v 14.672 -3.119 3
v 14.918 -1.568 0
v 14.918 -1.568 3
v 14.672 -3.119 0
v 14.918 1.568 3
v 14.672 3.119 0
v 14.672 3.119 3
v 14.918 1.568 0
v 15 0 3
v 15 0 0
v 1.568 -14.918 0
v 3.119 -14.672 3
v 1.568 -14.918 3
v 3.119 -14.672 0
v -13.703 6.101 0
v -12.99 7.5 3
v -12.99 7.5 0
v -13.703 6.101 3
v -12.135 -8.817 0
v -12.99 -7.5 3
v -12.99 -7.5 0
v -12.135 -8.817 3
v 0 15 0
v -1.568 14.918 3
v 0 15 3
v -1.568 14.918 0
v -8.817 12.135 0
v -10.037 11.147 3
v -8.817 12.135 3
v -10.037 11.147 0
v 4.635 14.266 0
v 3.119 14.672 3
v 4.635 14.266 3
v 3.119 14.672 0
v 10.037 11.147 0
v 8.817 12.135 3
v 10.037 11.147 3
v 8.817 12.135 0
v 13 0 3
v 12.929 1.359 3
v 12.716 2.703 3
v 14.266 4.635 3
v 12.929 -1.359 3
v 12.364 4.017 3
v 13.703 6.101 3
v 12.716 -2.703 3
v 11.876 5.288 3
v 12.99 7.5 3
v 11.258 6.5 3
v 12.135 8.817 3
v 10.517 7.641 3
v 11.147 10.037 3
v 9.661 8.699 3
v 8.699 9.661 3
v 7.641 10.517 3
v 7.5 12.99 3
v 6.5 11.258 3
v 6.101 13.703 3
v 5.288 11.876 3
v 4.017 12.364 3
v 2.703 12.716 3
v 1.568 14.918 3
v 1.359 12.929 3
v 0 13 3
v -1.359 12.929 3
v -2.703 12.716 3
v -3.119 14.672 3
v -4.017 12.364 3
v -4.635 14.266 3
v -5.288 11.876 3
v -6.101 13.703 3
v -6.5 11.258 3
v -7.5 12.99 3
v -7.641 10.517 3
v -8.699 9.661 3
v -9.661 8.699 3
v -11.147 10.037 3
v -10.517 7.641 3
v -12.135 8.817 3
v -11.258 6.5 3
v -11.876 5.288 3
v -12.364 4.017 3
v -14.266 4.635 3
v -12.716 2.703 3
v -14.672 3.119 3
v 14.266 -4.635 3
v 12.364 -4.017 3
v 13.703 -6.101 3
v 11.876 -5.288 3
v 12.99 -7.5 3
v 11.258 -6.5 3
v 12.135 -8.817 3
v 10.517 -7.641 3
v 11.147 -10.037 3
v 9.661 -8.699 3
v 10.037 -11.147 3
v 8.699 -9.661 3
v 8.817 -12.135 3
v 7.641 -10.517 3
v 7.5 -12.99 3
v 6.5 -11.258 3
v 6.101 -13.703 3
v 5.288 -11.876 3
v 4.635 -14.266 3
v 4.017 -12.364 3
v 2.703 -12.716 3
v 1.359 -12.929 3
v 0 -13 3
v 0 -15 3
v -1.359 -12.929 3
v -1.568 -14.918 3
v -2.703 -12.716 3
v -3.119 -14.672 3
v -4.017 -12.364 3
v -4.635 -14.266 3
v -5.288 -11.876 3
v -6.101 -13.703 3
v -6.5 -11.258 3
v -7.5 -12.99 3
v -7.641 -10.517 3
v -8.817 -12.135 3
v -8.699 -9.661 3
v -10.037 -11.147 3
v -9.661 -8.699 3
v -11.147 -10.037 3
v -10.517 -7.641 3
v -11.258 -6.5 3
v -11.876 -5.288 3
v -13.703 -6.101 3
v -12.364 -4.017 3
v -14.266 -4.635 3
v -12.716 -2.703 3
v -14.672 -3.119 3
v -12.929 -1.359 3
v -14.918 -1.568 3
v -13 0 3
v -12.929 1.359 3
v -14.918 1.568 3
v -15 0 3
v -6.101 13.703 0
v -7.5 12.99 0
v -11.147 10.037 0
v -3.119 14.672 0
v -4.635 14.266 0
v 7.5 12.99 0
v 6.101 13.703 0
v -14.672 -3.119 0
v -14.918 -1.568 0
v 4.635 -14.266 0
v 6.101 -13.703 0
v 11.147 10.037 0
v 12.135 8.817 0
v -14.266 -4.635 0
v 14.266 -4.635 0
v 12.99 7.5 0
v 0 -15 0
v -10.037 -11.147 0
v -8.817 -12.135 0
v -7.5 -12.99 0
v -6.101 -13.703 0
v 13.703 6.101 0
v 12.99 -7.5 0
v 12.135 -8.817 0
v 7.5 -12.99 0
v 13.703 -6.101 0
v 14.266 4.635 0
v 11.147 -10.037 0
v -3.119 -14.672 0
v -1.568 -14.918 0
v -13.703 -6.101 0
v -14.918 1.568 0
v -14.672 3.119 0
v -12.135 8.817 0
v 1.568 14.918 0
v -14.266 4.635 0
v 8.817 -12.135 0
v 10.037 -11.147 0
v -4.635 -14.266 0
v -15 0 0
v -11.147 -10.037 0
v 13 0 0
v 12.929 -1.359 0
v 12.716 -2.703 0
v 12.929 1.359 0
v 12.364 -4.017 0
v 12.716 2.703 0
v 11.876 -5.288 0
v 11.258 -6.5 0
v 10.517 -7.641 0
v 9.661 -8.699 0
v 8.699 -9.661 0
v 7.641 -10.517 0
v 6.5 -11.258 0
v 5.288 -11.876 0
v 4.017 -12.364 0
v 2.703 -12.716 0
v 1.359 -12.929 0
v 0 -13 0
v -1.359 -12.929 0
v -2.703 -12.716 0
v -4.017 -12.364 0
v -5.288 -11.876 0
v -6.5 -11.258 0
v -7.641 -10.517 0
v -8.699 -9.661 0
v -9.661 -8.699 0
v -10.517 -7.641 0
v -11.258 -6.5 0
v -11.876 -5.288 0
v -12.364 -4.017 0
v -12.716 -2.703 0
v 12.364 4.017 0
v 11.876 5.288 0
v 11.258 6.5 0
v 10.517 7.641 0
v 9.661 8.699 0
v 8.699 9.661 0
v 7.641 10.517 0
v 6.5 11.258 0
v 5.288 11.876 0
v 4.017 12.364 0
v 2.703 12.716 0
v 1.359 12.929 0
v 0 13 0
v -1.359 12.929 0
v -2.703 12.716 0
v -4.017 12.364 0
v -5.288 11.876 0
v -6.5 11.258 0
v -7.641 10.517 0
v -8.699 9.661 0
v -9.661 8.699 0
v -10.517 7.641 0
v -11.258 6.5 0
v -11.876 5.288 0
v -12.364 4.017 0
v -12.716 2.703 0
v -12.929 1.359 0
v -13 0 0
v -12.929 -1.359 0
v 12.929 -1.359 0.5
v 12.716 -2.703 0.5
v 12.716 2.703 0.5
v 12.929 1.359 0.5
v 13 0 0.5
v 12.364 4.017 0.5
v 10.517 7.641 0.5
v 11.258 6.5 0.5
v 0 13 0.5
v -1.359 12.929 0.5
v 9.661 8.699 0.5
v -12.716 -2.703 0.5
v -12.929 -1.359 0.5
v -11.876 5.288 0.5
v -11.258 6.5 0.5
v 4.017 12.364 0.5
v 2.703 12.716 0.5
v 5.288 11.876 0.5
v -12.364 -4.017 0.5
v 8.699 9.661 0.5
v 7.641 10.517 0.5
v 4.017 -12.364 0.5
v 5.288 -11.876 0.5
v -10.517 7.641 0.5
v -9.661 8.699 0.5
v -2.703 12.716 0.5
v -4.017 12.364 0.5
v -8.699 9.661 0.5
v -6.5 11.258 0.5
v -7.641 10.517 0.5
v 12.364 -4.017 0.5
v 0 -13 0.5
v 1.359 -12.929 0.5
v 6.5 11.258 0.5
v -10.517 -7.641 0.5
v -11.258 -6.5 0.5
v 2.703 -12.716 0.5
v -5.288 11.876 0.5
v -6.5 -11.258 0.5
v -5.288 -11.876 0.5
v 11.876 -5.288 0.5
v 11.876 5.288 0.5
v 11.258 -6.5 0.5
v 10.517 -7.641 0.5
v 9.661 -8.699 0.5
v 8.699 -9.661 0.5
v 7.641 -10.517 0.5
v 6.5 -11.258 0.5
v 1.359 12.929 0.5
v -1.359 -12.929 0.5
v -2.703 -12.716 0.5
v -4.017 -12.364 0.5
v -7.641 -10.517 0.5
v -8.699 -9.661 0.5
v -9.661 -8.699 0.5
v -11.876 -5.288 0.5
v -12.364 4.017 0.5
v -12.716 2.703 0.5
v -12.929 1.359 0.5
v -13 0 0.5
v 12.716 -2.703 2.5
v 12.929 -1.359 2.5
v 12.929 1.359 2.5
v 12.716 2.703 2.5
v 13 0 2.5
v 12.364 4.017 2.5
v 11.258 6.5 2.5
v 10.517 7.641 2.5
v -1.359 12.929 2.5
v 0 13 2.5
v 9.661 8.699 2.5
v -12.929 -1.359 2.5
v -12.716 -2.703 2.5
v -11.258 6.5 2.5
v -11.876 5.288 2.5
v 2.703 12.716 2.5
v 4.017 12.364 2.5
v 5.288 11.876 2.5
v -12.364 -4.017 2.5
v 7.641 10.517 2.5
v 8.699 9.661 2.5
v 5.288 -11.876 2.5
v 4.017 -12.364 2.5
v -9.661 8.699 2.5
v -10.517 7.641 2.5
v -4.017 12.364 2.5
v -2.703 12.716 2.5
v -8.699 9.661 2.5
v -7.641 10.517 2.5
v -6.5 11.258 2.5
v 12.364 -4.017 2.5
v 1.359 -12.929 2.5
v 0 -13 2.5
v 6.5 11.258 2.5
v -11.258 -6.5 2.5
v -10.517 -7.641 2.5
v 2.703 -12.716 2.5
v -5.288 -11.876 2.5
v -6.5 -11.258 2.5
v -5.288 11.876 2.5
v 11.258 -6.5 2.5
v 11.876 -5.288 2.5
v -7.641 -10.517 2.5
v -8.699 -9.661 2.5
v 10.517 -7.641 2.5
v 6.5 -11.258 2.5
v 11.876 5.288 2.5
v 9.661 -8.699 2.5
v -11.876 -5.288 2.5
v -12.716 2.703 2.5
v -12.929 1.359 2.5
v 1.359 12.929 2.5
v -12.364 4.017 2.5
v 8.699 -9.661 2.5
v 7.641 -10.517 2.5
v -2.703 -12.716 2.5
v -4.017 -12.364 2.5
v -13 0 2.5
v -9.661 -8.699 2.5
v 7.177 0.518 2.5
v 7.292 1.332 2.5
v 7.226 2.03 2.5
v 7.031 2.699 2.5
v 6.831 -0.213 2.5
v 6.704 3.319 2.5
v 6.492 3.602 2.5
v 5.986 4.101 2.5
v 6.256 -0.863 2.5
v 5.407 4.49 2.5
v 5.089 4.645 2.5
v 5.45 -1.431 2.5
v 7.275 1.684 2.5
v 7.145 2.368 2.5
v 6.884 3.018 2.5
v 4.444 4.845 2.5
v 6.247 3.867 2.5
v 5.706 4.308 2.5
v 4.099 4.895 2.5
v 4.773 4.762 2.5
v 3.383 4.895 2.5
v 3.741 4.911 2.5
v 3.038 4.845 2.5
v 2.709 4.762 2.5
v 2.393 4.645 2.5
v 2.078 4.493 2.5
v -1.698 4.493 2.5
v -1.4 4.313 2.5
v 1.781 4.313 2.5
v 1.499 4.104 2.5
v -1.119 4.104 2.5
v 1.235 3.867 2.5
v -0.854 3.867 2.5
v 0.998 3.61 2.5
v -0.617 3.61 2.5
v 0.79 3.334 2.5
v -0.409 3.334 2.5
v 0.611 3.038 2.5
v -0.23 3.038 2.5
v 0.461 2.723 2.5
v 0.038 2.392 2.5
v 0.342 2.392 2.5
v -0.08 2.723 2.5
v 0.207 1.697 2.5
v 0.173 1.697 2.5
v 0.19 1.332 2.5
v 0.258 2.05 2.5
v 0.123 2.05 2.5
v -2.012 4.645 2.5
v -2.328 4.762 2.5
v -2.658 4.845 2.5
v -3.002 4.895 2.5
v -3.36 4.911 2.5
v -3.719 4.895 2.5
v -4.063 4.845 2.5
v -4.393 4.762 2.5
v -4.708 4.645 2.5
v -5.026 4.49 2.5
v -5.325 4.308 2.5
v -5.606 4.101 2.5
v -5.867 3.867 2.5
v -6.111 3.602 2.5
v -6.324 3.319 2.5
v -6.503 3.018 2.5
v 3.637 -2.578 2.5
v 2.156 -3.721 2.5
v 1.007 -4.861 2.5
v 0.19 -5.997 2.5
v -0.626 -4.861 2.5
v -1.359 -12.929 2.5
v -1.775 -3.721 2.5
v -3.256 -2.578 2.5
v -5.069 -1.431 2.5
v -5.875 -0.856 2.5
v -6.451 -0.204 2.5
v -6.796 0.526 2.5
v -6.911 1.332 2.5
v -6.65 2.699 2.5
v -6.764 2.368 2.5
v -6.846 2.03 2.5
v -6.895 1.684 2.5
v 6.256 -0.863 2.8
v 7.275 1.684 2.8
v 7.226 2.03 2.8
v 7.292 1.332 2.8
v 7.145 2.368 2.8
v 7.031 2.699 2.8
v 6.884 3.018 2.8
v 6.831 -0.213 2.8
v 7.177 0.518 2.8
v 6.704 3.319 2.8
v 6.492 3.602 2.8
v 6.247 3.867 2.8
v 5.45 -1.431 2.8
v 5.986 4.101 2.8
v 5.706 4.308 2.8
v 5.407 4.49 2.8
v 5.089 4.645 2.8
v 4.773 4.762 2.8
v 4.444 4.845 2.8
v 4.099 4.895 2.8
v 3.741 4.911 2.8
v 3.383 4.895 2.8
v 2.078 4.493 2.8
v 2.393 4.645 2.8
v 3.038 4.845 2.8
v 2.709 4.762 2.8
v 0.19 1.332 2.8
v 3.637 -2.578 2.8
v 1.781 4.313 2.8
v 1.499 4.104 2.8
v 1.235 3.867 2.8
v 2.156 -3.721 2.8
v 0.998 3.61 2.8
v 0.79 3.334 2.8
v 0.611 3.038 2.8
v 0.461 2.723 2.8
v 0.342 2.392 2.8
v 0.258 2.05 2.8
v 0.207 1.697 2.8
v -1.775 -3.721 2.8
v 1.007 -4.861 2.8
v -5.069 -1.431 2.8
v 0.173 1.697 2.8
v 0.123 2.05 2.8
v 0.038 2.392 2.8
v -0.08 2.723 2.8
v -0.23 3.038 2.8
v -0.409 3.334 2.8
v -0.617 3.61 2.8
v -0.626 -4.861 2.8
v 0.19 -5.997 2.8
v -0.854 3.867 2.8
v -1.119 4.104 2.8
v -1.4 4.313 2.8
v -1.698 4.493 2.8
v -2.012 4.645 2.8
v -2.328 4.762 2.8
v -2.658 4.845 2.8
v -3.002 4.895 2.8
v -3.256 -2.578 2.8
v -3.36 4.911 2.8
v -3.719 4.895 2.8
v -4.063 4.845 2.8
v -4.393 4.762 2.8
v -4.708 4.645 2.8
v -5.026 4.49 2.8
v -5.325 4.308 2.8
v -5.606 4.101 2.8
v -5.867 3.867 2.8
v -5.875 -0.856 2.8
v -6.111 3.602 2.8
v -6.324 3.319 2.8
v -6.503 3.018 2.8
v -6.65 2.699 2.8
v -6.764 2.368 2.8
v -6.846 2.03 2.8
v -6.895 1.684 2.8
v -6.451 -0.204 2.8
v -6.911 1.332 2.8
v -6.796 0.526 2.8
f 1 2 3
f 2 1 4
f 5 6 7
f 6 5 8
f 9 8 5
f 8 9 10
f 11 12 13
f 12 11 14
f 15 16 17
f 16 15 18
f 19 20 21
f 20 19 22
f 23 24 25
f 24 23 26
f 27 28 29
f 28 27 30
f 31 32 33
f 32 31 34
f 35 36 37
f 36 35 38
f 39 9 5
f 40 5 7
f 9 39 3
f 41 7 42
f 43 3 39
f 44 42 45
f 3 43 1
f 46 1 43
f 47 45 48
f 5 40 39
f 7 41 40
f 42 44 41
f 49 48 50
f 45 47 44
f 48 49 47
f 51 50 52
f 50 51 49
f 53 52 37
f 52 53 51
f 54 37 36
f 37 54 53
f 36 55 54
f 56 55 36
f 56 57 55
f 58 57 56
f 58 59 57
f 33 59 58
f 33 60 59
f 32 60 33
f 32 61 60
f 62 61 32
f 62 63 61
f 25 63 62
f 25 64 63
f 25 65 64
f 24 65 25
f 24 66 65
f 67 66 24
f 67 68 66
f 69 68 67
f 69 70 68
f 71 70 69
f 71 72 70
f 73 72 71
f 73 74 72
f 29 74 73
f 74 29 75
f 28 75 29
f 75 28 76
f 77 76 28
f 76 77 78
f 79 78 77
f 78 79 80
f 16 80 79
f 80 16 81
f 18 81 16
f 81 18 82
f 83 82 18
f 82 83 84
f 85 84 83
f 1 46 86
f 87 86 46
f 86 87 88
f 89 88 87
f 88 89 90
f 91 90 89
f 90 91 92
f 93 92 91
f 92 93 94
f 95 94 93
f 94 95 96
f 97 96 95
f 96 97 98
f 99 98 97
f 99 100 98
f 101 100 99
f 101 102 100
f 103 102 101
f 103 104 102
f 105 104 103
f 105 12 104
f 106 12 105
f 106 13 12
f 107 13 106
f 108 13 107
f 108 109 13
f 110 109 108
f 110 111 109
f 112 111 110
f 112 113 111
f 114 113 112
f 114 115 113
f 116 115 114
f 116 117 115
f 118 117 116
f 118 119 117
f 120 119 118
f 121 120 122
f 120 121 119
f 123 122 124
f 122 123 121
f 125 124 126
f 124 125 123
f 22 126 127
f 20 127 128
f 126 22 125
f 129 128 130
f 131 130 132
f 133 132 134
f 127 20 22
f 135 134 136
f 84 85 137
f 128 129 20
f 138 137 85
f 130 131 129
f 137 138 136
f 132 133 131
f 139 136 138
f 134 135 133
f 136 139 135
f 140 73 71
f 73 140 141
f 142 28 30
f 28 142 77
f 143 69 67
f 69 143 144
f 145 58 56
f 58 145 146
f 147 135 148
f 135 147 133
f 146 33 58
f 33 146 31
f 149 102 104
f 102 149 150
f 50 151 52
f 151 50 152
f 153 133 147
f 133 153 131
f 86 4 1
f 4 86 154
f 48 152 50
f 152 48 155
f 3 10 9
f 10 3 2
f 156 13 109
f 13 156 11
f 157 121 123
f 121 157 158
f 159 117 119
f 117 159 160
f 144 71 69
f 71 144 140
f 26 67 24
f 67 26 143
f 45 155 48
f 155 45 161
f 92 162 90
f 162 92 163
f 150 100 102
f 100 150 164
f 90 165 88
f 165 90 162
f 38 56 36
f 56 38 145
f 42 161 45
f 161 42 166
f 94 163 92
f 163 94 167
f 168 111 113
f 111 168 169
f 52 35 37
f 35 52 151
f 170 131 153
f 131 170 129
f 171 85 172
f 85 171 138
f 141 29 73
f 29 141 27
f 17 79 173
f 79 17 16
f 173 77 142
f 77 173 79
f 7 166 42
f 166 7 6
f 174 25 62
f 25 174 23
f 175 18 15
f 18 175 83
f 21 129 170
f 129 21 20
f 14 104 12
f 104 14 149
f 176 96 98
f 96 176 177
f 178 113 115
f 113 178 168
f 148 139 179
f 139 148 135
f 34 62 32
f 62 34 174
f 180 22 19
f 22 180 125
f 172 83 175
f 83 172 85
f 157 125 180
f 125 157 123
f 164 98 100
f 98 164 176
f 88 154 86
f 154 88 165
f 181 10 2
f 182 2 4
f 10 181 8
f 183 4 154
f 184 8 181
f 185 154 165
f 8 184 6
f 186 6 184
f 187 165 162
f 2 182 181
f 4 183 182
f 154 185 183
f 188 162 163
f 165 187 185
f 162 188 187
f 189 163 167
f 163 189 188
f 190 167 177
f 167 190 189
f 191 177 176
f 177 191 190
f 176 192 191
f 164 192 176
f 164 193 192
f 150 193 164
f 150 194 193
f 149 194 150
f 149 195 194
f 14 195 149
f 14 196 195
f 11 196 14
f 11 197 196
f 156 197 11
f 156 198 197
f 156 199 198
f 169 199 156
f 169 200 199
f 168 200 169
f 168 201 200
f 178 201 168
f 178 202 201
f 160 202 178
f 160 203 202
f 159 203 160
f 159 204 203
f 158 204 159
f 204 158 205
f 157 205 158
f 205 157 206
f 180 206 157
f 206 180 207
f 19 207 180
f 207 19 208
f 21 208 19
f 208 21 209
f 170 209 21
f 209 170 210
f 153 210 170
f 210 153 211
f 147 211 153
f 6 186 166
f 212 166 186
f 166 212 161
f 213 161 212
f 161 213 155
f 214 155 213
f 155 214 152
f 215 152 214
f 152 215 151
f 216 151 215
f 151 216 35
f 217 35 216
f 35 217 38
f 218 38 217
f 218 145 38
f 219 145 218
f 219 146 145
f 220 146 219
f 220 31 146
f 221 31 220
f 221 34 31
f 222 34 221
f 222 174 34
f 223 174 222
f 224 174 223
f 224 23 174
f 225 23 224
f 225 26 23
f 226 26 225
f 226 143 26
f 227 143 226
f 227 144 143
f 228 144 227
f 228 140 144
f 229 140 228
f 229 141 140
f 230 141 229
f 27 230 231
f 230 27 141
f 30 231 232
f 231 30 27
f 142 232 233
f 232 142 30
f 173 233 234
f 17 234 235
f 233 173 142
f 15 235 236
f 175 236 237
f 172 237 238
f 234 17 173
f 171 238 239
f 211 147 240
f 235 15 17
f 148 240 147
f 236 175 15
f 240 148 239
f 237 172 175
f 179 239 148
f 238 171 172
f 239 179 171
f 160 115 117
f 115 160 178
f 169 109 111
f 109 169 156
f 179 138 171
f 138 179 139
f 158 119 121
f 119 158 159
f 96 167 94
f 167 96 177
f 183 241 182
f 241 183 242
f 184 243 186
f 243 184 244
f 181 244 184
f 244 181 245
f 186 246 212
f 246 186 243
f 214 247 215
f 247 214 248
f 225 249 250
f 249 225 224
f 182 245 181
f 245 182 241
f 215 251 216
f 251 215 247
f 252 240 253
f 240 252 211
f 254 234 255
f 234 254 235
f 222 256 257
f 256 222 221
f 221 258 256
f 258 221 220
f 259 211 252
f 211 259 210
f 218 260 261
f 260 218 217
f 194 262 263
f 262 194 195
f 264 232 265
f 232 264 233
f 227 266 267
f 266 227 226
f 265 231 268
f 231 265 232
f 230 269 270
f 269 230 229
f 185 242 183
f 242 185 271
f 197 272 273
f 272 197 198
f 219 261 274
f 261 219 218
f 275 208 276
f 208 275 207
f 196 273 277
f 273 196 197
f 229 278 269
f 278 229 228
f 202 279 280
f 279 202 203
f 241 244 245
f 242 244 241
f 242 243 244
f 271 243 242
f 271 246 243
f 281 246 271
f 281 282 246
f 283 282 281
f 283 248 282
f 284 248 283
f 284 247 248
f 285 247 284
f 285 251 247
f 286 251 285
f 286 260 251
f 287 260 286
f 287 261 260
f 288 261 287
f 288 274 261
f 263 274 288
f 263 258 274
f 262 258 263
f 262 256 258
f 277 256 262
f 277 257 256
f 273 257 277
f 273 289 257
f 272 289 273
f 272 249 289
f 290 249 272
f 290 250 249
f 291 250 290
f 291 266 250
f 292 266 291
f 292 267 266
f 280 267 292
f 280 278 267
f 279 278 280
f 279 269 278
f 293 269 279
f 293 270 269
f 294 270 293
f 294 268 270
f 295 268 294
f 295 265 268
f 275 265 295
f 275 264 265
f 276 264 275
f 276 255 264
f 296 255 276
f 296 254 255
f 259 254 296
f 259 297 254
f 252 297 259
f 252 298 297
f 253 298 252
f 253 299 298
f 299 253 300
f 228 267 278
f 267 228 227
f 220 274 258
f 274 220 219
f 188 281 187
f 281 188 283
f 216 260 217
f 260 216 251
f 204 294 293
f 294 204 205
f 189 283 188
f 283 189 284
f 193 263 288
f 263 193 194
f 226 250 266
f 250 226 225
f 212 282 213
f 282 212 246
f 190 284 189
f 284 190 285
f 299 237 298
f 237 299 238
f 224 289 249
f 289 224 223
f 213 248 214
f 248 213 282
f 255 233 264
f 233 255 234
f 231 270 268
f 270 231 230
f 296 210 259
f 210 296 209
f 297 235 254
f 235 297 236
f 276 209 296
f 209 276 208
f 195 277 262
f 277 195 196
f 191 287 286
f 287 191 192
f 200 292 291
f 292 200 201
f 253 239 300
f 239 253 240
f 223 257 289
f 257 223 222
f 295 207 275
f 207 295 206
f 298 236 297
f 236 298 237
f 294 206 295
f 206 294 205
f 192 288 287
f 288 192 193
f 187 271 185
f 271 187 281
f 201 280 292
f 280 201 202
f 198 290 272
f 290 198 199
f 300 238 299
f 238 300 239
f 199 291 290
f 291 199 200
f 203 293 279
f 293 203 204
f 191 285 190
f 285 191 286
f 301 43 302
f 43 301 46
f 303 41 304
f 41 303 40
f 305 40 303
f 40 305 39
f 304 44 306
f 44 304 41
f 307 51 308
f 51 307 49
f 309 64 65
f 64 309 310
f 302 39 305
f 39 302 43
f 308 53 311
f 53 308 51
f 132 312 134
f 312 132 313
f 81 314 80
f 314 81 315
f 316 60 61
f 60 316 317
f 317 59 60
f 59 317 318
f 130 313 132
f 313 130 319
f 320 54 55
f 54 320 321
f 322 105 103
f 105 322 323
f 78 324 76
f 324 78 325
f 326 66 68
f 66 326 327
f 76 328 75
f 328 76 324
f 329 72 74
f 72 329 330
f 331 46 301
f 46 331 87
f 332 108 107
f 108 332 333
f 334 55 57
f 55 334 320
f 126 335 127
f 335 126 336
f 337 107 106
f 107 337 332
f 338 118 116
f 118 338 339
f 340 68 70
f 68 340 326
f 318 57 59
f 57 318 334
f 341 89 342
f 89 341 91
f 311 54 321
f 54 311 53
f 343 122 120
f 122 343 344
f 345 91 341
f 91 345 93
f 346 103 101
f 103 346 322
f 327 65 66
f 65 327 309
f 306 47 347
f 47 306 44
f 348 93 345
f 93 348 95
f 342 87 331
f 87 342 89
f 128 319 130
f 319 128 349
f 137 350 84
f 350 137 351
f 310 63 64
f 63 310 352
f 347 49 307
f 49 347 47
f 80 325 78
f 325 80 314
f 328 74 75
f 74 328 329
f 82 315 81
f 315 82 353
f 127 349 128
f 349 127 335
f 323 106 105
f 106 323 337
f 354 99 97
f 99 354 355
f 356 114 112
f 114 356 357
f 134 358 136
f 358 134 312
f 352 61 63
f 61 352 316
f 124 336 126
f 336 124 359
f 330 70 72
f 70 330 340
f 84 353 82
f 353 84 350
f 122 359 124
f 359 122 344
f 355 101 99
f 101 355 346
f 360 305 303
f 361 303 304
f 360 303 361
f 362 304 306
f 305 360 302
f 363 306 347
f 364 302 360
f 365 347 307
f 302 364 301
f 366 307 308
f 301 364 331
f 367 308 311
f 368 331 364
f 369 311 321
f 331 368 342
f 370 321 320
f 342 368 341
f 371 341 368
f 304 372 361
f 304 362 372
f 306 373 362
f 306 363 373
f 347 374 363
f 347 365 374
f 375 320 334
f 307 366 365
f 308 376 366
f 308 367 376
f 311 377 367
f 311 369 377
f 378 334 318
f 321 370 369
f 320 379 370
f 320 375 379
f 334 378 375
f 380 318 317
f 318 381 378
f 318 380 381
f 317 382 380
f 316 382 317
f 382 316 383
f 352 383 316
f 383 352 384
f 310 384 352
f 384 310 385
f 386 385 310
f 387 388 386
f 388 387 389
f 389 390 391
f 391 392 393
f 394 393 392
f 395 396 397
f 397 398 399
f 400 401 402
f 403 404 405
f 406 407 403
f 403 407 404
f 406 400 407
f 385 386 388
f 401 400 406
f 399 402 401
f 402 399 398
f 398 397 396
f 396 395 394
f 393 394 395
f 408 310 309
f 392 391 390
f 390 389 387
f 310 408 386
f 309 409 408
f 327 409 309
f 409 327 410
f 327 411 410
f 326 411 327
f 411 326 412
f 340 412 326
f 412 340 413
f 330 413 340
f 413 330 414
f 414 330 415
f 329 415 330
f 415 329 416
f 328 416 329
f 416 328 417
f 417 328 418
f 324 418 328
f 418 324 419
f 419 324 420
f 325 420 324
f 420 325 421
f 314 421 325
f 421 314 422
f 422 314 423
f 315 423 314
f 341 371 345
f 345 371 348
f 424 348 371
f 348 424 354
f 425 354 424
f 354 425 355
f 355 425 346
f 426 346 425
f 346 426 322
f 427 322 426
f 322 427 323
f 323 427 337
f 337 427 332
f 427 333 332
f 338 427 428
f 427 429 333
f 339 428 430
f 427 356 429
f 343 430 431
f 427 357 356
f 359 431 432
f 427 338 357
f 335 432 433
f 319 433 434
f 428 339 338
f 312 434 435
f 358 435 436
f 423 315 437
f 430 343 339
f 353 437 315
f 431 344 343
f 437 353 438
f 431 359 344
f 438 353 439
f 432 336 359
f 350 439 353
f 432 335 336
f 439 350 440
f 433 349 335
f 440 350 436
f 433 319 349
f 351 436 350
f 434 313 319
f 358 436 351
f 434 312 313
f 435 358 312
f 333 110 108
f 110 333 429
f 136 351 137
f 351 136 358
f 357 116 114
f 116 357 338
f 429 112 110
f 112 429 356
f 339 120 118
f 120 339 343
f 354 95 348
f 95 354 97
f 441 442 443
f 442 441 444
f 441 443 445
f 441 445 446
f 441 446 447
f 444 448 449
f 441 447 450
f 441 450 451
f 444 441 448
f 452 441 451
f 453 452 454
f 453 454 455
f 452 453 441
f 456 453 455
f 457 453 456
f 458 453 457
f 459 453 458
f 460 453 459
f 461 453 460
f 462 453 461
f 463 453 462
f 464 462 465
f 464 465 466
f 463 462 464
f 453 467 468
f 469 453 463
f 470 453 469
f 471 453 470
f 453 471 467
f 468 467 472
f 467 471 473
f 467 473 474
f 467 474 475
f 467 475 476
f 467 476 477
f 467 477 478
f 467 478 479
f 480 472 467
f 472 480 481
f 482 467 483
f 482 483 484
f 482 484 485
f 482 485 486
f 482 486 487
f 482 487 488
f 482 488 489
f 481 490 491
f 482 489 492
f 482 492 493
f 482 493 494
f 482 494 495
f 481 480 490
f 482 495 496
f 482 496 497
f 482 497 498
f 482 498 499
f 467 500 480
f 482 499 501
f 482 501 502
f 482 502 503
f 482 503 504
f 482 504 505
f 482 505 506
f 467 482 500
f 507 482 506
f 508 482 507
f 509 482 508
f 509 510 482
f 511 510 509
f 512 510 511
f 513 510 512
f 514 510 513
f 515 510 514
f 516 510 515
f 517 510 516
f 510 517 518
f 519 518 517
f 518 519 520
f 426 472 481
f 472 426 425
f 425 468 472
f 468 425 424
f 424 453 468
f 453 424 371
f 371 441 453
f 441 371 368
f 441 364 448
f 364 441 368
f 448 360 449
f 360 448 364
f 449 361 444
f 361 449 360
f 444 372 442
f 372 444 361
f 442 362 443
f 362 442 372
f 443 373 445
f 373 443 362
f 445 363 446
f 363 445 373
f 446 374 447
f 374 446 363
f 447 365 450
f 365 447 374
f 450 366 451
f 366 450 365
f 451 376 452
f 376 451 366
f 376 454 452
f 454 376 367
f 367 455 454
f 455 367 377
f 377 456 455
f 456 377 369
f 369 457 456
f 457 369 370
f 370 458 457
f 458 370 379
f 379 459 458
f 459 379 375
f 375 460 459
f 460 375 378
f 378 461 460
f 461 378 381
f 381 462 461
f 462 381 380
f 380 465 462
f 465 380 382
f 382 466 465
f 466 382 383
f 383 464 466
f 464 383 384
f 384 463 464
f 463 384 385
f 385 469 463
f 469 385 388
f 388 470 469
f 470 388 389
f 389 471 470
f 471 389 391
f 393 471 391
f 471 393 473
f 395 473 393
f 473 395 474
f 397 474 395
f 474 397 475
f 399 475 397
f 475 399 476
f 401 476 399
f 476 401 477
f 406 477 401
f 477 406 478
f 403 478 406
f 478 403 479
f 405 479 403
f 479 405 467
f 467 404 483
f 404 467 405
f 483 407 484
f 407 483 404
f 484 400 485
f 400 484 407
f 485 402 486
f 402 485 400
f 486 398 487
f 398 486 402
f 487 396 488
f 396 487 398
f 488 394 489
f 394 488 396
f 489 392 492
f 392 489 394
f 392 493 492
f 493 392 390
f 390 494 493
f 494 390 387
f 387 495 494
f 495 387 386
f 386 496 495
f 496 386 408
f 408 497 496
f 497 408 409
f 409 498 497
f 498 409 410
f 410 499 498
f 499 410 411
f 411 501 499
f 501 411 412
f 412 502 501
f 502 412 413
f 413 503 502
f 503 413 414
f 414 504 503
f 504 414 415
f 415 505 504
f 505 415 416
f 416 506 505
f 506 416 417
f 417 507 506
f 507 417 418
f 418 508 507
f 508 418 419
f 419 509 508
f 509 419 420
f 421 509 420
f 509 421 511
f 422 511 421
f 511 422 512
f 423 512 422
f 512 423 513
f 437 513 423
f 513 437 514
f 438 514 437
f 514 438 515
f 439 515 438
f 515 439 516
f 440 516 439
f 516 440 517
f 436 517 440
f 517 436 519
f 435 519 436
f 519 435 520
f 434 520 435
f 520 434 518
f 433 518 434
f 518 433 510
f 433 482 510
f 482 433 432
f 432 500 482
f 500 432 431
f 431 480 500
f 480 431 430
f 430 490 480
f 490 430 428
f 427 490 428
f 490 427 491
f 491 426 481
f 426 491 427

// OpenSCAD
// file: token-empty.scad
module token_empty(diameter_mm=30, thickness_mm=3, ridge_width_mm=2, ridge_depth_mm=0.5) {
    $fn=60;
    difference() {
        cylinder(r=diameter_mm/2, h=thickness_mm);
        translate([0,0,-ridge_depth_mm]) {
            cylinder(r=diameter_mm/2-ridge_width_mm, h=2*ridge_depth_mm);
        }
        cylinder(r=diameter_mm/2-ridge_width_mm, h=ridge_depth_mm);
        translate([0,0,thickness_mm-ridge_depth_mm]) {
            cylinder(r=diameter_mm/2-ridge_width_mm, h=2-ridge_depth_mm);
        }
    }
}

token_empty();
// main file
use <token-empty.scad>

module token_with_sign(sign, adjust_height_mm=0, font="Arial Unicode MS", sign_thickness_mm=0.3, size=14, diameter_mm=30, thickness_mm=3, ridge_width_mm=2, ridge_depth_mm=0.5) {
    token_empty(diameter_mm, thickness_mm, ridge_width_mm, ridge_depth_mm);
    translate([0, adjust_height_mm, thickness_mm-ridge_depth_mm+sign_thickness_mm]) {
        scale([1,1,-2*sign_thickness_mm]) {
            linear_extrude(1) text(sign, halign="center", valign="center", size=size, font=font);
        }
    }
}

token_with_sign(sign="❤︎", adjust_height_mm=-1.5);
//token_with_sign(sign="❥");
